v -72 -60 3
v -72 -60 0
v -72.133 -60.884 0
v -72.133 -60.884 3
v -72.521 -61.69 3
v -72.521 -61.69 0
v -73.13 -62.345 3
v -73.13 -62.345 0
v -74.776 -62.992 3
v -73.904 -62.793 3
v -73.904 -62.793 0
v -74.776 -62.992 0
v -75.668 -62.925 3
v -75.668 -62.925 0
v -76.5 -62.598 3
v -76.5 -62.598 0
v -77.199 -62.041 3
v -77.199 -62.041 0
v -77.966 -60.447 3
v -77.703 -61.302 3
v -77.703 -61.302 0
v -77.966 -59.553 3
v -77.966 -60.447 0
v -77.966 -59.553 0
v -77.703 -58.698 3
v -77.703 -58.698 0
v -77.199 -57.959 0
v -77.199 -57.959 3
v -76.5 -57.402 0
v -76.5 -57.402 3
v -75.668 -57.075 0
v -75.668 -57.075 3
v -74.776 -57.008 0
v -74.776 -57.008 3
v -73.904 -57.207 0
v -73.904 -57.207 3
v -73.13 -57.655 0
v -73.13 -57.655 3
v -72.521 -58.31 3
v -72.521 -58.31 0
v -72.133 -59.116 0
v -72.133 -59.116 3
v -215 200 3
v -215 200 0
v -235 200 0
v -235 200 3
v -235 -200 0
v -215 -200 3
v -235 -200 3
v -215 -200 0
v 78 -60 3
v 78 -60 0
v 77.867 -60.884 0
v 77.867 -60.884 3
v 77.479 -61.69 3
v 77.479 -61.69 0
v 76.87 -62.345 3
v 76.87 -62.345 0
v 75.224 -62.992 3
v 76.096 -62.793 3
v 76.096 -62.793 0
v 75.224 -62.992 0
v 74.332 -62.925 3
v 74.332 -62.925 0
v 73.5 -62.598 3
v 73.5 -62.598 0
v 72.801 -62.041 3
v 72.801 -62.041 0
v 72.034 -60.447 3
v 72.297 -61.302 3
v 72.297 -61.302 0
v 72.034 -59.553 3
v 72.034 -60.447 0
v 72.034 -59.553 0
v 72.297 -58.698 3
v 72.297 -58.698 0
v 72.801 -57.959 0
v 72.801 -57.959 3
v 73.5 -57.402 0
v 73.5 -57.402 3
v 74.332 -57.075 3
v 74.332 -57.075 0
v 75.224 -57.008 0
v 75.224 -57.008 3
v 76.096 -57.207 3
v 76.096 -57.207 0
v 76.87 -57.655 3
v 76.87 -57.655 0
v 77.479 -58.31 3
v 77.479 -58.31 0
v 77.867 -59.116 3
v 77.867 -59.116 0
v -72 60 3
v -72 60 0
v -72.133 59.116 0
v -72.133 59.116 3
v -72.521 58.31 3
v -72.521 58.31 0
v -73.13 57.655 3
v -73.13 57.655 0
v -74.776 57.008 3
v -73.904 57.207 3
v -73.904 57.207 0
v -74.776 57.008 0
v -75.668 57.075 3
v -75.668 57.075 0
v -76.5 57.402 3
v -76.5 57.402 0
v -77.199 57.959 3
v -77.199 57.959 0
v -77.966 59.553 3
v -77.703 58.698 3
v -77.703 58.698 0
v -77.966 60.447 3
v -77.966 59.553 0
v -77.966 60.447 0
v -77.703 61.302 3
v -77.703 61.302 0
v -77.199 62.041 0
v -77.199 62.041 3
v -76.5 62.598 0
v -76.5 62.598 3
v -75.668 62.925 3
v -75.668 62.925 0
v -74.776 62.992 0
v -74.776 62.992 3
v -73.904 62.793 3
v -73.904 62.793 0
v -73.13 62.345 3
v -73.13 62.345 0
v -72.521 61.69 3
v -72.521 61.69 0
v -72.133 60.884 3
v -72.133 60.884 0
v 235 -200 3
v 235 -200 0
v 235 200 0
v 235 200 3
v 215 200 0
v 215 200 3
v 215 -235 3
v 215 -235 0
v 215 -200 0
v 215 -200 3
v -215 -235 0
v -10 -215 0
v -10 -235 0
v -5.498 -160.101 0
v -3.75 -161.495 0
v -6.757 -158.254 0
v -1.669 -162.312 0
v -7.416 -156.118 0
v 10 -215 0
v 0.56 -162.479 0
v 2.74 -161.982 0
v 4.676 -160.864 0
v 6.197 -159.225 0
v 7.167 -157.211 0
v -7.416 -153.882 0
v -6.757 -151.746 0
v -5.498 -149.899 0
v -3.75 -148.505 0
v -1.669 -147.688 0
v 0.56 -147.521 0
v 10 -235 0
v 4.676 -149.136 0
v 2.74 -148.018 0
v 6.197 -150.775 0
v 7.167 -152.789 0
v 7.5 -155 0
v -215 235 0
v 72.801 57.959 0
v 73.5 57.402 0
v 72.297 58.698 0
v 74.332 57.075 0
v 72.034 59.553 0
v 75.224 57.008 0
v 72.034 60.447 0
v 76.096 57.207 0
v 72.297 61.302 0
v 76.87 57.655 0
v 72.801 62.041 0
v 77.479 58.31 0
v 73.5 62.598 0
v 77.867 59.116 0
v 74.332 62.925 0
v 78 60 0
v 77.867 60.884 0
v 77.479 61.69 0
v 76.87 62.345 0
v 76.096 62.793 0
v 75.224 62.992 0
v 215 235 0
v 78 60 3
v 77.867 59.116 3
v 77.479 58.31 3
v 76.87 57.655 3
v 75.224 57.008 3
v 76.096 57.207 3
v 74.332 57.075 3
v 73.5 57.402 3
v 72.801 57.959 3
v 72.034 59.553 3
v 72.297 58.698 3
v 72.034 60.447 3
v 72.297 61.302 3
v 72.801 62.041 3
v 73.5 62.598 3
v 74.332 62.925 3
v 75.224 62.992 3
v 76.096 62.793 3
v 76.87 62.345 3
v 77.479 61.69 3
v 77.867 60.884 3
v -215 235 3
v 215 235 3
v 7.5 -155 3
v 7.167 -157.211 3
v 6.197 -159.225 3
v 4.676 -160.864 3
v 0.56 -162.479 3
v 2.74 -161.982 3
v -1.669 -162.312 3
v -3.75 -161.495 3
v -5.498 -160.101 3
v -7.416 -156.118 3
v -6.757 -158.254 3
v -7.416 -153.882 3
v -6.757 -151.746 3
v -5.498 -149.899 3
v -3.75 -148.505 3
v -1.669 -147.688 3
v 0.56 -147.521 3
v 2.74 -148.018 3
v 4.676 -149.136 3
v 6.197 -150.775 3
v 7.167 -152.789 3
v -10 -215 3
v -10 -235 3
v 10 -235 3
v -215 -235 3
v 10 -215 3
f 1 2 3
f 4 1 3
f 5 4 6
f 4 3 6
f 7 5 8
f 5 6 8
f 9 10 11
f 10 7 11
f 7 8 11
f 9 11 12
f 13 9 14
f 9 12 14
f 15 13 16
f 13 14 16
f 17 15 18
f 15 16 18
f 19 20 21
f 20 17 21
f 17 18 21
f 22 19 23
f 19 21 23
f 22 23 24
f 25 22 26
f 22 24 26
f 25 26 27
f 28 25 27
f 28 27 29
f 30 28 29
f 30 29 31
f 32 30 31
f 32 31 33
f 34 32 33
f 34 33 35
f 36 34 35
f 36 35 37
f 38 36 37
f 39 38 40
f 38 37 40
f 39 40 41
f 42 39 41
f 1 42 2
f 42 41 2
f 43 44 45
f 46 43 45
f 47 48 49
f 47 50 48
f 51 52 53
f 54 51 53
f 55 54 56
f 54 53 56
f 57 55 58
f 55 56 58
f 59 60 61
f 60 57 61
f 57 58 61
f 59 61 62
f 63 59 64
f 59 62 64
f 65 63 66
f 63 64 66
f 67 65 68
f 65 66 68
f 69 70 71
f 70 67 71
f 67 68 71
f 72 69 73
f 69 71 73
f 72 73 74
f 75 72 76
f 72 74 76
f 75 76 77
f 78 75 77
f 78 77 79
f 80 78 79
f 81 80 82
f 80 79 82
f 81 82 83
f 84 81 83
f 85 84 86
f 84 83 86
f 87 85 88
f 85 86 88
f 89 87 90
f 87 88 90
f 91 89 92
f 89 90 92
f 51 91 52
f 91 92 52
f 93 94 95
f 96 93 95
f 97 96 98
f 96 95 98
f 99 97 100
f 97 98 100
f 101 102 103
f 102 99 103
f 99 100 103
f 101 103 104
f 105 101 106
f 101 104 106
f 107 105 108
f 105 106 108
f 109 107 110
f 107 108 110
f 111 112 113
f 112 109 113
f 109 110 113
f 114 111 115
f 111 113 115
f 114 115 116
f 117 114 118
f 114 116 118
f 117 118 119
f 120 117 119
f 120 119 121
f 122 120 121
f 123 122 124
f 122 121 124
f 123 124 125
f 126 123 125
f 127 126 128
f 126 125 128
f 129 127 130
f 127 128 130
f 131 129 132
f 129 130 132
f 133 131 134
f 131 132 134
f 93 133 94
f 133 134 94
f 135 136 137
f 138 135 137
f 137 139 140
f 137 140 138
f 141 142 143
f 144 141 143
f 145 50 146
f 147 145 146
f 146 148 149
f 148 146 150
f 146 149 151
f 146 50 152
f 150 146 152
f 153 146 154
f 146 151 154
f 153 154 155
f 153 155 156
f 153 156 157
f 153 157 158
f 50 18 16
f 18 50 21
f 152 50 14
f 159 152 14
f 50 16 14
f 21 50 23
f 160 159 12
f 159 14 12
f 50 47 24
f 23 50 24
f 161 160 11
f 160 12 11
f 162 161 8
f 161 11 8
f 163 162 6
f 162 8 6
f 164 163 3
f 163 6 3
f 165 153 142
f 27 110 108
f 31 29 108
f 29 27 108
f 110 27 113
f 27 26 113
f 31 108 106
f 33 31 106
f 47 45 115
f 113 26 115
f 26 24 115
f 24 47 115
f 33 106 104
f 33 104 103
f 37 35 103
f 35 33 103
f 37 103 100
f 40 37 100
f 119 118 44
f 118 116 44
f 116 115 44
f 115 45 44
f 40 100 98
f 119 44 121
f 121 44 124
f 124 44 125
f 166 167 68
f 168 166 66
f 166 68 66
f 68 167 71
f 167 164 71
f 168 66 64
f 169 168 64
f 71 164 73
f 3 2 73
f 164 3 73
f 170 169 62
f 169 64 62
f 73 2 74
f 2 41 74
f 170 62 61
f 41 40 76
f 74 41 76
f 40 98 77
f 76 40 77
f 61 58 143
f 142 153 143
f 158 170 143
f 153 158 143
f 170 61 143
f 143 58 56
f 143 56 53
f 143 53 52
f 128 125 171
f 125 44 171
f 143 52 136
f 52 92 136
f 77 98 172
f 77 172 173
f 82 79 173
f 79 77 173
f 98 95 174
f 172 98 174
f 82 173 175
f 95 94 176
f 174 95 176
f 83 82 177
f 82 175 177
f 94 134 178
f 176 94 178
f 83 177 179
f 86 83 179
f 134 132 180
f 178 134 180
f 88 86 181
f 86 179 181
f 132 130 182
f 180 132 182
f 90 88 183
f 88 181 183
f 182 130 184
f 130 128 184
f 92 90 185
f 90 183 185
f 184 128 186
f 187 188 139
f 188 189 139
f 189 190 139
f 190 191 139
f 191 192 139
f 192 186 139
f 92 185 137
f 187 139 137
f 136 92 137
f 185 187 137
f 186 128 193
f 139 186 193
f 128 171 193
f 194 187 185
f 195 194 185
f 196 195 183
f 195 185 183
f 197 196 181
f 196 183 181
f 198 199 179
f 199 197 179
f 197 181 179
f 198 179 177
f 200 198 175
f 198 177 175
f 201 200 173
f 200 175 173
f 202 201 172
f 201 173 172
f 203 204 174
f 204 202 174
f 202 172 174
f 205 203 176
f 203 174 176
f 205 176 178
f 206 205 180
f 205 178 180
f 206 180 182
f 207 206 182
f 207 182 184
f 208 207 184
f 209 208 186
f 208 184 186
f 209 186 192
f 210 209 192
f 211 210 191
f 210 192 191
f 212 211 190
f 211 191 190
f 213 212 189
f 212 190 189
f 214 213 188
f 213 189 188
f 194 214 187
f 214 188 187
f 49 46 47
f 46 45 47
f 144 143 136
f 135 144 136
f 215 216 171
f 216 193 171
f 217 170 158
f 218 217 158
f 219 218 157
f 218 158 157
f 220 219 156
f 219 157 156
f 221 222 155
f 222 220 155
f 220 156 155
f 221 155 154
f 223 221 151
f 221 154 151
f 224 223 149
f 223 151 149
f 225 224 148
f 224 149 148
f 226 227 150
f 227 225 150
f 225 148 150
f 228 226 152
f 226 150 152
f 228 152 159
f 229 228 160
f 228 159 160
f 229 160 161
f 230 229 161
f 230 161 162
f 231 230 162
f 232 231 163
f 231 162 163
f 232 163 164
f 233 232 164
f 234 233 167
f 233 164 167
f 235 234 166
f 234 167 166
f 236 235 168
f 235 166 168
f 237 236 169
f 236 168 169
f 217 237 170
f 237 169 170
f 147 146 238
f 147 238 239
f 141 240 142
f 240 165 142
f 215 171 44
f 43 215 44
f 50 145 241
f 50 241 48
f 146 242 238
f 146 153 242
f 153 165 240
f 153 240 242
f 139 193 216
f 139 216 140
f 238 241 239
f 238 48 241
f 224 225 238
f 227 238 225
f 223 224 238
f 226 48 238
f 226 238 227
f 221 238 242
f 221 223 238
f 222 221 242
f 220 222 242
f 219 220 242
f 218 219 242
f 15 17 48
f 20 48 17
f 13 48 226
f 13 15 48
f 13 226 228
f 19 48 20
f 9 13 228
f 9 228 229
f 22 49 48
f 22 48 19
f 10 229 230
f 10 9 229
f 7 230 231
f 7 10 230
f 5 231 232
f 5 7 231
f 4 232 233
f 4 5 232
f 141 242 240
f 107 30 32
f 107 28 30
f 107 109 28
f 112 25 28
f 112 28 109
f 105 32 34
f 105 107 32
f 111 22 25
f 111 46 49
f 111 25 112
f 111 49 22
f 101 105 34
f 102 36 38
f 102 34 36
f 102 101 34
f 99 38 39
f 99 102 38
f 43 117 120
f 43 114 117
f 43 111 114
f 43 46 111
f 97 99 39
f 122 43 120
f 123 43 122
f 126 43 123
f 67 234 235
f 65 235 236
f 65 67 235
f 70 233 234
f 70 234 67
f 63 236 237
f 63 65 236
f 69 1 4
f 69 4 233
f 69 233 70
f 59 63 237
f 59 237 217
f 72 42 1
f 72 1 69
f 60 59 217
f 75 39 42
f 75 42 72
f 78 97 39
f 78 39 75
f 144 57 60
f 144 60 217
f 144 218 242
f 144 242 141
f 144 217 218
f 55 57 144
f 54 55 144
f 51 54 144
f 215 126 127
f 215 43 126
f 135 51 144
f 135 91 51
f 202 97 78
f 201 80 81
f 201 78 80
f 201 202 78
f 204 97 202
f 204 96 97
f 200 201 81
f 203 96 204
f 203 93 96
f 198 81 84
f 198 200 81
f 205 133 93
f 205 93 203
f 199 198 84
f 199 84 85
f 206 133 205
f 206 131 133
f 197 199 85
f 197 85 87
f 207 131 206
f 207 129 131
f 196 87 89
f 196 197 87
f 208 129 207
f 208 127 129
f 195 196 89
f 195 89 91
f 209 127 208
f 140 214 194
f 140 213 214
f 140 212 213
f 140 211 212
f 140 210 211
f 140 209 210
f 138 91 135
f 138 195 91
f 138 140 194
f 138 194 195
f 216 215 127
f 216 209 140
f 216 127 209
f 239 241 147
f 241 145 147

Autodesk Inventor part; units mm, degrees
ref_plane "YZ Plane" through (0, 0, 0) normal (1, 0, 0) x (0, 1, 0)
ref_plane "XZ Plane" through (0, 0, 0) normal (0, 1, 0) x (-1, 0, 0)
ref_plane "XY Plane" through (0, 0, 0) normal (0, 0, 1) x (1, 0, 0)
sketch "Skizze1" plane through (0, 0, 0) normal (0, 0, 1) x (1, 0, 0)
  line L0 (-235, -235) -> (235, -235)
  line L1 (235, -235) -> (235, 235)
  line L2 (235, 235) -> (-235, 235)
  line L3 (-235, 235) -> (-235, -235)
  line L4 (-235, -235) -> (235, 235) construction
  line L5 (235, -235) -> (-235, 235) construction
  line L6 (-235, -235) -> (-215, -235)
  line L7 (-215, -235) -> (-215, -200)
  line L8 (-215, -200) -> (-235, -200)
  line L9 (-235, -200) -> (-235, -235)
  line L10 (235, -235) -> (215, -235)
  line L11 (215, -235) -> (215, -200)
  line L12 (215, -200) -> (235, -200)
  line L13 (235, -200) -> (235, -235)
  line L14 (235, 235) -> (215, 235)
  line L15 (215, 235) -> (215, 200)
  line L16 (215, 200) -> (235, 200)
  line L17 (235, 200) -> (235, 235)
  line L18 (-235, 235) -> (-215, 235)
  line L19 (-215, 235) -> (-215, 200)
  line L20 (-215, 200) -> (-235, 200)
  line L21 (-235, 200) -> (-235, 235)
  line L22 (-10, -235) -> (10, -235)
  line L23 (10, -235) -> (10, -215)
  line L24 (10, -215) -> (-10, -215)
  line L25 (-10, -215) -> (-10, -235)
  circle A0 centre (0, -155) radius 7.5
  circle A1 centre (-75, 60) radius 3
  circle A2 centre (75, 60) radius 3
  circle A3 centre (75, -60) radius 3
  circle A4 centre (-75, -60) radius 3
  line L26 (-75, -60) -> (75, -60) construction
  line L27 (75, -60) -> (75, 60) construction
  line L28 (75, 60) -> (-75, 60) construction
  line L29 (-75, 60) -> (-75, -60) construction
  line L30 (-75, -60) -> (75, 60) construction
  line L31 (75, -60) -> (-75, 60) construction
  point P0 (0, 0)
  point P1 (0, -235)
  dimension "d0" = 470
  dimension "d1" = 470
  dimension "d4" = 35
  dimension "d5" = 20
  dimension "d6" = 20
  dimension "d7" = 20
  dimension "d8" = 15
  dimension "d9" = 80
  dimension "d10" = 150
  dimension "d11" = 120
  dimension "d12" = 6
extrude "Extrusion1" add sketch "Skizze1" along normal blind 3 contours L7 L8 L3 L20 L19 L2 L15 L16 L1 L12 L11 L0 L23 L24 L25
properties part number "Panel Bottom" material "Polycarbonat, klar"
